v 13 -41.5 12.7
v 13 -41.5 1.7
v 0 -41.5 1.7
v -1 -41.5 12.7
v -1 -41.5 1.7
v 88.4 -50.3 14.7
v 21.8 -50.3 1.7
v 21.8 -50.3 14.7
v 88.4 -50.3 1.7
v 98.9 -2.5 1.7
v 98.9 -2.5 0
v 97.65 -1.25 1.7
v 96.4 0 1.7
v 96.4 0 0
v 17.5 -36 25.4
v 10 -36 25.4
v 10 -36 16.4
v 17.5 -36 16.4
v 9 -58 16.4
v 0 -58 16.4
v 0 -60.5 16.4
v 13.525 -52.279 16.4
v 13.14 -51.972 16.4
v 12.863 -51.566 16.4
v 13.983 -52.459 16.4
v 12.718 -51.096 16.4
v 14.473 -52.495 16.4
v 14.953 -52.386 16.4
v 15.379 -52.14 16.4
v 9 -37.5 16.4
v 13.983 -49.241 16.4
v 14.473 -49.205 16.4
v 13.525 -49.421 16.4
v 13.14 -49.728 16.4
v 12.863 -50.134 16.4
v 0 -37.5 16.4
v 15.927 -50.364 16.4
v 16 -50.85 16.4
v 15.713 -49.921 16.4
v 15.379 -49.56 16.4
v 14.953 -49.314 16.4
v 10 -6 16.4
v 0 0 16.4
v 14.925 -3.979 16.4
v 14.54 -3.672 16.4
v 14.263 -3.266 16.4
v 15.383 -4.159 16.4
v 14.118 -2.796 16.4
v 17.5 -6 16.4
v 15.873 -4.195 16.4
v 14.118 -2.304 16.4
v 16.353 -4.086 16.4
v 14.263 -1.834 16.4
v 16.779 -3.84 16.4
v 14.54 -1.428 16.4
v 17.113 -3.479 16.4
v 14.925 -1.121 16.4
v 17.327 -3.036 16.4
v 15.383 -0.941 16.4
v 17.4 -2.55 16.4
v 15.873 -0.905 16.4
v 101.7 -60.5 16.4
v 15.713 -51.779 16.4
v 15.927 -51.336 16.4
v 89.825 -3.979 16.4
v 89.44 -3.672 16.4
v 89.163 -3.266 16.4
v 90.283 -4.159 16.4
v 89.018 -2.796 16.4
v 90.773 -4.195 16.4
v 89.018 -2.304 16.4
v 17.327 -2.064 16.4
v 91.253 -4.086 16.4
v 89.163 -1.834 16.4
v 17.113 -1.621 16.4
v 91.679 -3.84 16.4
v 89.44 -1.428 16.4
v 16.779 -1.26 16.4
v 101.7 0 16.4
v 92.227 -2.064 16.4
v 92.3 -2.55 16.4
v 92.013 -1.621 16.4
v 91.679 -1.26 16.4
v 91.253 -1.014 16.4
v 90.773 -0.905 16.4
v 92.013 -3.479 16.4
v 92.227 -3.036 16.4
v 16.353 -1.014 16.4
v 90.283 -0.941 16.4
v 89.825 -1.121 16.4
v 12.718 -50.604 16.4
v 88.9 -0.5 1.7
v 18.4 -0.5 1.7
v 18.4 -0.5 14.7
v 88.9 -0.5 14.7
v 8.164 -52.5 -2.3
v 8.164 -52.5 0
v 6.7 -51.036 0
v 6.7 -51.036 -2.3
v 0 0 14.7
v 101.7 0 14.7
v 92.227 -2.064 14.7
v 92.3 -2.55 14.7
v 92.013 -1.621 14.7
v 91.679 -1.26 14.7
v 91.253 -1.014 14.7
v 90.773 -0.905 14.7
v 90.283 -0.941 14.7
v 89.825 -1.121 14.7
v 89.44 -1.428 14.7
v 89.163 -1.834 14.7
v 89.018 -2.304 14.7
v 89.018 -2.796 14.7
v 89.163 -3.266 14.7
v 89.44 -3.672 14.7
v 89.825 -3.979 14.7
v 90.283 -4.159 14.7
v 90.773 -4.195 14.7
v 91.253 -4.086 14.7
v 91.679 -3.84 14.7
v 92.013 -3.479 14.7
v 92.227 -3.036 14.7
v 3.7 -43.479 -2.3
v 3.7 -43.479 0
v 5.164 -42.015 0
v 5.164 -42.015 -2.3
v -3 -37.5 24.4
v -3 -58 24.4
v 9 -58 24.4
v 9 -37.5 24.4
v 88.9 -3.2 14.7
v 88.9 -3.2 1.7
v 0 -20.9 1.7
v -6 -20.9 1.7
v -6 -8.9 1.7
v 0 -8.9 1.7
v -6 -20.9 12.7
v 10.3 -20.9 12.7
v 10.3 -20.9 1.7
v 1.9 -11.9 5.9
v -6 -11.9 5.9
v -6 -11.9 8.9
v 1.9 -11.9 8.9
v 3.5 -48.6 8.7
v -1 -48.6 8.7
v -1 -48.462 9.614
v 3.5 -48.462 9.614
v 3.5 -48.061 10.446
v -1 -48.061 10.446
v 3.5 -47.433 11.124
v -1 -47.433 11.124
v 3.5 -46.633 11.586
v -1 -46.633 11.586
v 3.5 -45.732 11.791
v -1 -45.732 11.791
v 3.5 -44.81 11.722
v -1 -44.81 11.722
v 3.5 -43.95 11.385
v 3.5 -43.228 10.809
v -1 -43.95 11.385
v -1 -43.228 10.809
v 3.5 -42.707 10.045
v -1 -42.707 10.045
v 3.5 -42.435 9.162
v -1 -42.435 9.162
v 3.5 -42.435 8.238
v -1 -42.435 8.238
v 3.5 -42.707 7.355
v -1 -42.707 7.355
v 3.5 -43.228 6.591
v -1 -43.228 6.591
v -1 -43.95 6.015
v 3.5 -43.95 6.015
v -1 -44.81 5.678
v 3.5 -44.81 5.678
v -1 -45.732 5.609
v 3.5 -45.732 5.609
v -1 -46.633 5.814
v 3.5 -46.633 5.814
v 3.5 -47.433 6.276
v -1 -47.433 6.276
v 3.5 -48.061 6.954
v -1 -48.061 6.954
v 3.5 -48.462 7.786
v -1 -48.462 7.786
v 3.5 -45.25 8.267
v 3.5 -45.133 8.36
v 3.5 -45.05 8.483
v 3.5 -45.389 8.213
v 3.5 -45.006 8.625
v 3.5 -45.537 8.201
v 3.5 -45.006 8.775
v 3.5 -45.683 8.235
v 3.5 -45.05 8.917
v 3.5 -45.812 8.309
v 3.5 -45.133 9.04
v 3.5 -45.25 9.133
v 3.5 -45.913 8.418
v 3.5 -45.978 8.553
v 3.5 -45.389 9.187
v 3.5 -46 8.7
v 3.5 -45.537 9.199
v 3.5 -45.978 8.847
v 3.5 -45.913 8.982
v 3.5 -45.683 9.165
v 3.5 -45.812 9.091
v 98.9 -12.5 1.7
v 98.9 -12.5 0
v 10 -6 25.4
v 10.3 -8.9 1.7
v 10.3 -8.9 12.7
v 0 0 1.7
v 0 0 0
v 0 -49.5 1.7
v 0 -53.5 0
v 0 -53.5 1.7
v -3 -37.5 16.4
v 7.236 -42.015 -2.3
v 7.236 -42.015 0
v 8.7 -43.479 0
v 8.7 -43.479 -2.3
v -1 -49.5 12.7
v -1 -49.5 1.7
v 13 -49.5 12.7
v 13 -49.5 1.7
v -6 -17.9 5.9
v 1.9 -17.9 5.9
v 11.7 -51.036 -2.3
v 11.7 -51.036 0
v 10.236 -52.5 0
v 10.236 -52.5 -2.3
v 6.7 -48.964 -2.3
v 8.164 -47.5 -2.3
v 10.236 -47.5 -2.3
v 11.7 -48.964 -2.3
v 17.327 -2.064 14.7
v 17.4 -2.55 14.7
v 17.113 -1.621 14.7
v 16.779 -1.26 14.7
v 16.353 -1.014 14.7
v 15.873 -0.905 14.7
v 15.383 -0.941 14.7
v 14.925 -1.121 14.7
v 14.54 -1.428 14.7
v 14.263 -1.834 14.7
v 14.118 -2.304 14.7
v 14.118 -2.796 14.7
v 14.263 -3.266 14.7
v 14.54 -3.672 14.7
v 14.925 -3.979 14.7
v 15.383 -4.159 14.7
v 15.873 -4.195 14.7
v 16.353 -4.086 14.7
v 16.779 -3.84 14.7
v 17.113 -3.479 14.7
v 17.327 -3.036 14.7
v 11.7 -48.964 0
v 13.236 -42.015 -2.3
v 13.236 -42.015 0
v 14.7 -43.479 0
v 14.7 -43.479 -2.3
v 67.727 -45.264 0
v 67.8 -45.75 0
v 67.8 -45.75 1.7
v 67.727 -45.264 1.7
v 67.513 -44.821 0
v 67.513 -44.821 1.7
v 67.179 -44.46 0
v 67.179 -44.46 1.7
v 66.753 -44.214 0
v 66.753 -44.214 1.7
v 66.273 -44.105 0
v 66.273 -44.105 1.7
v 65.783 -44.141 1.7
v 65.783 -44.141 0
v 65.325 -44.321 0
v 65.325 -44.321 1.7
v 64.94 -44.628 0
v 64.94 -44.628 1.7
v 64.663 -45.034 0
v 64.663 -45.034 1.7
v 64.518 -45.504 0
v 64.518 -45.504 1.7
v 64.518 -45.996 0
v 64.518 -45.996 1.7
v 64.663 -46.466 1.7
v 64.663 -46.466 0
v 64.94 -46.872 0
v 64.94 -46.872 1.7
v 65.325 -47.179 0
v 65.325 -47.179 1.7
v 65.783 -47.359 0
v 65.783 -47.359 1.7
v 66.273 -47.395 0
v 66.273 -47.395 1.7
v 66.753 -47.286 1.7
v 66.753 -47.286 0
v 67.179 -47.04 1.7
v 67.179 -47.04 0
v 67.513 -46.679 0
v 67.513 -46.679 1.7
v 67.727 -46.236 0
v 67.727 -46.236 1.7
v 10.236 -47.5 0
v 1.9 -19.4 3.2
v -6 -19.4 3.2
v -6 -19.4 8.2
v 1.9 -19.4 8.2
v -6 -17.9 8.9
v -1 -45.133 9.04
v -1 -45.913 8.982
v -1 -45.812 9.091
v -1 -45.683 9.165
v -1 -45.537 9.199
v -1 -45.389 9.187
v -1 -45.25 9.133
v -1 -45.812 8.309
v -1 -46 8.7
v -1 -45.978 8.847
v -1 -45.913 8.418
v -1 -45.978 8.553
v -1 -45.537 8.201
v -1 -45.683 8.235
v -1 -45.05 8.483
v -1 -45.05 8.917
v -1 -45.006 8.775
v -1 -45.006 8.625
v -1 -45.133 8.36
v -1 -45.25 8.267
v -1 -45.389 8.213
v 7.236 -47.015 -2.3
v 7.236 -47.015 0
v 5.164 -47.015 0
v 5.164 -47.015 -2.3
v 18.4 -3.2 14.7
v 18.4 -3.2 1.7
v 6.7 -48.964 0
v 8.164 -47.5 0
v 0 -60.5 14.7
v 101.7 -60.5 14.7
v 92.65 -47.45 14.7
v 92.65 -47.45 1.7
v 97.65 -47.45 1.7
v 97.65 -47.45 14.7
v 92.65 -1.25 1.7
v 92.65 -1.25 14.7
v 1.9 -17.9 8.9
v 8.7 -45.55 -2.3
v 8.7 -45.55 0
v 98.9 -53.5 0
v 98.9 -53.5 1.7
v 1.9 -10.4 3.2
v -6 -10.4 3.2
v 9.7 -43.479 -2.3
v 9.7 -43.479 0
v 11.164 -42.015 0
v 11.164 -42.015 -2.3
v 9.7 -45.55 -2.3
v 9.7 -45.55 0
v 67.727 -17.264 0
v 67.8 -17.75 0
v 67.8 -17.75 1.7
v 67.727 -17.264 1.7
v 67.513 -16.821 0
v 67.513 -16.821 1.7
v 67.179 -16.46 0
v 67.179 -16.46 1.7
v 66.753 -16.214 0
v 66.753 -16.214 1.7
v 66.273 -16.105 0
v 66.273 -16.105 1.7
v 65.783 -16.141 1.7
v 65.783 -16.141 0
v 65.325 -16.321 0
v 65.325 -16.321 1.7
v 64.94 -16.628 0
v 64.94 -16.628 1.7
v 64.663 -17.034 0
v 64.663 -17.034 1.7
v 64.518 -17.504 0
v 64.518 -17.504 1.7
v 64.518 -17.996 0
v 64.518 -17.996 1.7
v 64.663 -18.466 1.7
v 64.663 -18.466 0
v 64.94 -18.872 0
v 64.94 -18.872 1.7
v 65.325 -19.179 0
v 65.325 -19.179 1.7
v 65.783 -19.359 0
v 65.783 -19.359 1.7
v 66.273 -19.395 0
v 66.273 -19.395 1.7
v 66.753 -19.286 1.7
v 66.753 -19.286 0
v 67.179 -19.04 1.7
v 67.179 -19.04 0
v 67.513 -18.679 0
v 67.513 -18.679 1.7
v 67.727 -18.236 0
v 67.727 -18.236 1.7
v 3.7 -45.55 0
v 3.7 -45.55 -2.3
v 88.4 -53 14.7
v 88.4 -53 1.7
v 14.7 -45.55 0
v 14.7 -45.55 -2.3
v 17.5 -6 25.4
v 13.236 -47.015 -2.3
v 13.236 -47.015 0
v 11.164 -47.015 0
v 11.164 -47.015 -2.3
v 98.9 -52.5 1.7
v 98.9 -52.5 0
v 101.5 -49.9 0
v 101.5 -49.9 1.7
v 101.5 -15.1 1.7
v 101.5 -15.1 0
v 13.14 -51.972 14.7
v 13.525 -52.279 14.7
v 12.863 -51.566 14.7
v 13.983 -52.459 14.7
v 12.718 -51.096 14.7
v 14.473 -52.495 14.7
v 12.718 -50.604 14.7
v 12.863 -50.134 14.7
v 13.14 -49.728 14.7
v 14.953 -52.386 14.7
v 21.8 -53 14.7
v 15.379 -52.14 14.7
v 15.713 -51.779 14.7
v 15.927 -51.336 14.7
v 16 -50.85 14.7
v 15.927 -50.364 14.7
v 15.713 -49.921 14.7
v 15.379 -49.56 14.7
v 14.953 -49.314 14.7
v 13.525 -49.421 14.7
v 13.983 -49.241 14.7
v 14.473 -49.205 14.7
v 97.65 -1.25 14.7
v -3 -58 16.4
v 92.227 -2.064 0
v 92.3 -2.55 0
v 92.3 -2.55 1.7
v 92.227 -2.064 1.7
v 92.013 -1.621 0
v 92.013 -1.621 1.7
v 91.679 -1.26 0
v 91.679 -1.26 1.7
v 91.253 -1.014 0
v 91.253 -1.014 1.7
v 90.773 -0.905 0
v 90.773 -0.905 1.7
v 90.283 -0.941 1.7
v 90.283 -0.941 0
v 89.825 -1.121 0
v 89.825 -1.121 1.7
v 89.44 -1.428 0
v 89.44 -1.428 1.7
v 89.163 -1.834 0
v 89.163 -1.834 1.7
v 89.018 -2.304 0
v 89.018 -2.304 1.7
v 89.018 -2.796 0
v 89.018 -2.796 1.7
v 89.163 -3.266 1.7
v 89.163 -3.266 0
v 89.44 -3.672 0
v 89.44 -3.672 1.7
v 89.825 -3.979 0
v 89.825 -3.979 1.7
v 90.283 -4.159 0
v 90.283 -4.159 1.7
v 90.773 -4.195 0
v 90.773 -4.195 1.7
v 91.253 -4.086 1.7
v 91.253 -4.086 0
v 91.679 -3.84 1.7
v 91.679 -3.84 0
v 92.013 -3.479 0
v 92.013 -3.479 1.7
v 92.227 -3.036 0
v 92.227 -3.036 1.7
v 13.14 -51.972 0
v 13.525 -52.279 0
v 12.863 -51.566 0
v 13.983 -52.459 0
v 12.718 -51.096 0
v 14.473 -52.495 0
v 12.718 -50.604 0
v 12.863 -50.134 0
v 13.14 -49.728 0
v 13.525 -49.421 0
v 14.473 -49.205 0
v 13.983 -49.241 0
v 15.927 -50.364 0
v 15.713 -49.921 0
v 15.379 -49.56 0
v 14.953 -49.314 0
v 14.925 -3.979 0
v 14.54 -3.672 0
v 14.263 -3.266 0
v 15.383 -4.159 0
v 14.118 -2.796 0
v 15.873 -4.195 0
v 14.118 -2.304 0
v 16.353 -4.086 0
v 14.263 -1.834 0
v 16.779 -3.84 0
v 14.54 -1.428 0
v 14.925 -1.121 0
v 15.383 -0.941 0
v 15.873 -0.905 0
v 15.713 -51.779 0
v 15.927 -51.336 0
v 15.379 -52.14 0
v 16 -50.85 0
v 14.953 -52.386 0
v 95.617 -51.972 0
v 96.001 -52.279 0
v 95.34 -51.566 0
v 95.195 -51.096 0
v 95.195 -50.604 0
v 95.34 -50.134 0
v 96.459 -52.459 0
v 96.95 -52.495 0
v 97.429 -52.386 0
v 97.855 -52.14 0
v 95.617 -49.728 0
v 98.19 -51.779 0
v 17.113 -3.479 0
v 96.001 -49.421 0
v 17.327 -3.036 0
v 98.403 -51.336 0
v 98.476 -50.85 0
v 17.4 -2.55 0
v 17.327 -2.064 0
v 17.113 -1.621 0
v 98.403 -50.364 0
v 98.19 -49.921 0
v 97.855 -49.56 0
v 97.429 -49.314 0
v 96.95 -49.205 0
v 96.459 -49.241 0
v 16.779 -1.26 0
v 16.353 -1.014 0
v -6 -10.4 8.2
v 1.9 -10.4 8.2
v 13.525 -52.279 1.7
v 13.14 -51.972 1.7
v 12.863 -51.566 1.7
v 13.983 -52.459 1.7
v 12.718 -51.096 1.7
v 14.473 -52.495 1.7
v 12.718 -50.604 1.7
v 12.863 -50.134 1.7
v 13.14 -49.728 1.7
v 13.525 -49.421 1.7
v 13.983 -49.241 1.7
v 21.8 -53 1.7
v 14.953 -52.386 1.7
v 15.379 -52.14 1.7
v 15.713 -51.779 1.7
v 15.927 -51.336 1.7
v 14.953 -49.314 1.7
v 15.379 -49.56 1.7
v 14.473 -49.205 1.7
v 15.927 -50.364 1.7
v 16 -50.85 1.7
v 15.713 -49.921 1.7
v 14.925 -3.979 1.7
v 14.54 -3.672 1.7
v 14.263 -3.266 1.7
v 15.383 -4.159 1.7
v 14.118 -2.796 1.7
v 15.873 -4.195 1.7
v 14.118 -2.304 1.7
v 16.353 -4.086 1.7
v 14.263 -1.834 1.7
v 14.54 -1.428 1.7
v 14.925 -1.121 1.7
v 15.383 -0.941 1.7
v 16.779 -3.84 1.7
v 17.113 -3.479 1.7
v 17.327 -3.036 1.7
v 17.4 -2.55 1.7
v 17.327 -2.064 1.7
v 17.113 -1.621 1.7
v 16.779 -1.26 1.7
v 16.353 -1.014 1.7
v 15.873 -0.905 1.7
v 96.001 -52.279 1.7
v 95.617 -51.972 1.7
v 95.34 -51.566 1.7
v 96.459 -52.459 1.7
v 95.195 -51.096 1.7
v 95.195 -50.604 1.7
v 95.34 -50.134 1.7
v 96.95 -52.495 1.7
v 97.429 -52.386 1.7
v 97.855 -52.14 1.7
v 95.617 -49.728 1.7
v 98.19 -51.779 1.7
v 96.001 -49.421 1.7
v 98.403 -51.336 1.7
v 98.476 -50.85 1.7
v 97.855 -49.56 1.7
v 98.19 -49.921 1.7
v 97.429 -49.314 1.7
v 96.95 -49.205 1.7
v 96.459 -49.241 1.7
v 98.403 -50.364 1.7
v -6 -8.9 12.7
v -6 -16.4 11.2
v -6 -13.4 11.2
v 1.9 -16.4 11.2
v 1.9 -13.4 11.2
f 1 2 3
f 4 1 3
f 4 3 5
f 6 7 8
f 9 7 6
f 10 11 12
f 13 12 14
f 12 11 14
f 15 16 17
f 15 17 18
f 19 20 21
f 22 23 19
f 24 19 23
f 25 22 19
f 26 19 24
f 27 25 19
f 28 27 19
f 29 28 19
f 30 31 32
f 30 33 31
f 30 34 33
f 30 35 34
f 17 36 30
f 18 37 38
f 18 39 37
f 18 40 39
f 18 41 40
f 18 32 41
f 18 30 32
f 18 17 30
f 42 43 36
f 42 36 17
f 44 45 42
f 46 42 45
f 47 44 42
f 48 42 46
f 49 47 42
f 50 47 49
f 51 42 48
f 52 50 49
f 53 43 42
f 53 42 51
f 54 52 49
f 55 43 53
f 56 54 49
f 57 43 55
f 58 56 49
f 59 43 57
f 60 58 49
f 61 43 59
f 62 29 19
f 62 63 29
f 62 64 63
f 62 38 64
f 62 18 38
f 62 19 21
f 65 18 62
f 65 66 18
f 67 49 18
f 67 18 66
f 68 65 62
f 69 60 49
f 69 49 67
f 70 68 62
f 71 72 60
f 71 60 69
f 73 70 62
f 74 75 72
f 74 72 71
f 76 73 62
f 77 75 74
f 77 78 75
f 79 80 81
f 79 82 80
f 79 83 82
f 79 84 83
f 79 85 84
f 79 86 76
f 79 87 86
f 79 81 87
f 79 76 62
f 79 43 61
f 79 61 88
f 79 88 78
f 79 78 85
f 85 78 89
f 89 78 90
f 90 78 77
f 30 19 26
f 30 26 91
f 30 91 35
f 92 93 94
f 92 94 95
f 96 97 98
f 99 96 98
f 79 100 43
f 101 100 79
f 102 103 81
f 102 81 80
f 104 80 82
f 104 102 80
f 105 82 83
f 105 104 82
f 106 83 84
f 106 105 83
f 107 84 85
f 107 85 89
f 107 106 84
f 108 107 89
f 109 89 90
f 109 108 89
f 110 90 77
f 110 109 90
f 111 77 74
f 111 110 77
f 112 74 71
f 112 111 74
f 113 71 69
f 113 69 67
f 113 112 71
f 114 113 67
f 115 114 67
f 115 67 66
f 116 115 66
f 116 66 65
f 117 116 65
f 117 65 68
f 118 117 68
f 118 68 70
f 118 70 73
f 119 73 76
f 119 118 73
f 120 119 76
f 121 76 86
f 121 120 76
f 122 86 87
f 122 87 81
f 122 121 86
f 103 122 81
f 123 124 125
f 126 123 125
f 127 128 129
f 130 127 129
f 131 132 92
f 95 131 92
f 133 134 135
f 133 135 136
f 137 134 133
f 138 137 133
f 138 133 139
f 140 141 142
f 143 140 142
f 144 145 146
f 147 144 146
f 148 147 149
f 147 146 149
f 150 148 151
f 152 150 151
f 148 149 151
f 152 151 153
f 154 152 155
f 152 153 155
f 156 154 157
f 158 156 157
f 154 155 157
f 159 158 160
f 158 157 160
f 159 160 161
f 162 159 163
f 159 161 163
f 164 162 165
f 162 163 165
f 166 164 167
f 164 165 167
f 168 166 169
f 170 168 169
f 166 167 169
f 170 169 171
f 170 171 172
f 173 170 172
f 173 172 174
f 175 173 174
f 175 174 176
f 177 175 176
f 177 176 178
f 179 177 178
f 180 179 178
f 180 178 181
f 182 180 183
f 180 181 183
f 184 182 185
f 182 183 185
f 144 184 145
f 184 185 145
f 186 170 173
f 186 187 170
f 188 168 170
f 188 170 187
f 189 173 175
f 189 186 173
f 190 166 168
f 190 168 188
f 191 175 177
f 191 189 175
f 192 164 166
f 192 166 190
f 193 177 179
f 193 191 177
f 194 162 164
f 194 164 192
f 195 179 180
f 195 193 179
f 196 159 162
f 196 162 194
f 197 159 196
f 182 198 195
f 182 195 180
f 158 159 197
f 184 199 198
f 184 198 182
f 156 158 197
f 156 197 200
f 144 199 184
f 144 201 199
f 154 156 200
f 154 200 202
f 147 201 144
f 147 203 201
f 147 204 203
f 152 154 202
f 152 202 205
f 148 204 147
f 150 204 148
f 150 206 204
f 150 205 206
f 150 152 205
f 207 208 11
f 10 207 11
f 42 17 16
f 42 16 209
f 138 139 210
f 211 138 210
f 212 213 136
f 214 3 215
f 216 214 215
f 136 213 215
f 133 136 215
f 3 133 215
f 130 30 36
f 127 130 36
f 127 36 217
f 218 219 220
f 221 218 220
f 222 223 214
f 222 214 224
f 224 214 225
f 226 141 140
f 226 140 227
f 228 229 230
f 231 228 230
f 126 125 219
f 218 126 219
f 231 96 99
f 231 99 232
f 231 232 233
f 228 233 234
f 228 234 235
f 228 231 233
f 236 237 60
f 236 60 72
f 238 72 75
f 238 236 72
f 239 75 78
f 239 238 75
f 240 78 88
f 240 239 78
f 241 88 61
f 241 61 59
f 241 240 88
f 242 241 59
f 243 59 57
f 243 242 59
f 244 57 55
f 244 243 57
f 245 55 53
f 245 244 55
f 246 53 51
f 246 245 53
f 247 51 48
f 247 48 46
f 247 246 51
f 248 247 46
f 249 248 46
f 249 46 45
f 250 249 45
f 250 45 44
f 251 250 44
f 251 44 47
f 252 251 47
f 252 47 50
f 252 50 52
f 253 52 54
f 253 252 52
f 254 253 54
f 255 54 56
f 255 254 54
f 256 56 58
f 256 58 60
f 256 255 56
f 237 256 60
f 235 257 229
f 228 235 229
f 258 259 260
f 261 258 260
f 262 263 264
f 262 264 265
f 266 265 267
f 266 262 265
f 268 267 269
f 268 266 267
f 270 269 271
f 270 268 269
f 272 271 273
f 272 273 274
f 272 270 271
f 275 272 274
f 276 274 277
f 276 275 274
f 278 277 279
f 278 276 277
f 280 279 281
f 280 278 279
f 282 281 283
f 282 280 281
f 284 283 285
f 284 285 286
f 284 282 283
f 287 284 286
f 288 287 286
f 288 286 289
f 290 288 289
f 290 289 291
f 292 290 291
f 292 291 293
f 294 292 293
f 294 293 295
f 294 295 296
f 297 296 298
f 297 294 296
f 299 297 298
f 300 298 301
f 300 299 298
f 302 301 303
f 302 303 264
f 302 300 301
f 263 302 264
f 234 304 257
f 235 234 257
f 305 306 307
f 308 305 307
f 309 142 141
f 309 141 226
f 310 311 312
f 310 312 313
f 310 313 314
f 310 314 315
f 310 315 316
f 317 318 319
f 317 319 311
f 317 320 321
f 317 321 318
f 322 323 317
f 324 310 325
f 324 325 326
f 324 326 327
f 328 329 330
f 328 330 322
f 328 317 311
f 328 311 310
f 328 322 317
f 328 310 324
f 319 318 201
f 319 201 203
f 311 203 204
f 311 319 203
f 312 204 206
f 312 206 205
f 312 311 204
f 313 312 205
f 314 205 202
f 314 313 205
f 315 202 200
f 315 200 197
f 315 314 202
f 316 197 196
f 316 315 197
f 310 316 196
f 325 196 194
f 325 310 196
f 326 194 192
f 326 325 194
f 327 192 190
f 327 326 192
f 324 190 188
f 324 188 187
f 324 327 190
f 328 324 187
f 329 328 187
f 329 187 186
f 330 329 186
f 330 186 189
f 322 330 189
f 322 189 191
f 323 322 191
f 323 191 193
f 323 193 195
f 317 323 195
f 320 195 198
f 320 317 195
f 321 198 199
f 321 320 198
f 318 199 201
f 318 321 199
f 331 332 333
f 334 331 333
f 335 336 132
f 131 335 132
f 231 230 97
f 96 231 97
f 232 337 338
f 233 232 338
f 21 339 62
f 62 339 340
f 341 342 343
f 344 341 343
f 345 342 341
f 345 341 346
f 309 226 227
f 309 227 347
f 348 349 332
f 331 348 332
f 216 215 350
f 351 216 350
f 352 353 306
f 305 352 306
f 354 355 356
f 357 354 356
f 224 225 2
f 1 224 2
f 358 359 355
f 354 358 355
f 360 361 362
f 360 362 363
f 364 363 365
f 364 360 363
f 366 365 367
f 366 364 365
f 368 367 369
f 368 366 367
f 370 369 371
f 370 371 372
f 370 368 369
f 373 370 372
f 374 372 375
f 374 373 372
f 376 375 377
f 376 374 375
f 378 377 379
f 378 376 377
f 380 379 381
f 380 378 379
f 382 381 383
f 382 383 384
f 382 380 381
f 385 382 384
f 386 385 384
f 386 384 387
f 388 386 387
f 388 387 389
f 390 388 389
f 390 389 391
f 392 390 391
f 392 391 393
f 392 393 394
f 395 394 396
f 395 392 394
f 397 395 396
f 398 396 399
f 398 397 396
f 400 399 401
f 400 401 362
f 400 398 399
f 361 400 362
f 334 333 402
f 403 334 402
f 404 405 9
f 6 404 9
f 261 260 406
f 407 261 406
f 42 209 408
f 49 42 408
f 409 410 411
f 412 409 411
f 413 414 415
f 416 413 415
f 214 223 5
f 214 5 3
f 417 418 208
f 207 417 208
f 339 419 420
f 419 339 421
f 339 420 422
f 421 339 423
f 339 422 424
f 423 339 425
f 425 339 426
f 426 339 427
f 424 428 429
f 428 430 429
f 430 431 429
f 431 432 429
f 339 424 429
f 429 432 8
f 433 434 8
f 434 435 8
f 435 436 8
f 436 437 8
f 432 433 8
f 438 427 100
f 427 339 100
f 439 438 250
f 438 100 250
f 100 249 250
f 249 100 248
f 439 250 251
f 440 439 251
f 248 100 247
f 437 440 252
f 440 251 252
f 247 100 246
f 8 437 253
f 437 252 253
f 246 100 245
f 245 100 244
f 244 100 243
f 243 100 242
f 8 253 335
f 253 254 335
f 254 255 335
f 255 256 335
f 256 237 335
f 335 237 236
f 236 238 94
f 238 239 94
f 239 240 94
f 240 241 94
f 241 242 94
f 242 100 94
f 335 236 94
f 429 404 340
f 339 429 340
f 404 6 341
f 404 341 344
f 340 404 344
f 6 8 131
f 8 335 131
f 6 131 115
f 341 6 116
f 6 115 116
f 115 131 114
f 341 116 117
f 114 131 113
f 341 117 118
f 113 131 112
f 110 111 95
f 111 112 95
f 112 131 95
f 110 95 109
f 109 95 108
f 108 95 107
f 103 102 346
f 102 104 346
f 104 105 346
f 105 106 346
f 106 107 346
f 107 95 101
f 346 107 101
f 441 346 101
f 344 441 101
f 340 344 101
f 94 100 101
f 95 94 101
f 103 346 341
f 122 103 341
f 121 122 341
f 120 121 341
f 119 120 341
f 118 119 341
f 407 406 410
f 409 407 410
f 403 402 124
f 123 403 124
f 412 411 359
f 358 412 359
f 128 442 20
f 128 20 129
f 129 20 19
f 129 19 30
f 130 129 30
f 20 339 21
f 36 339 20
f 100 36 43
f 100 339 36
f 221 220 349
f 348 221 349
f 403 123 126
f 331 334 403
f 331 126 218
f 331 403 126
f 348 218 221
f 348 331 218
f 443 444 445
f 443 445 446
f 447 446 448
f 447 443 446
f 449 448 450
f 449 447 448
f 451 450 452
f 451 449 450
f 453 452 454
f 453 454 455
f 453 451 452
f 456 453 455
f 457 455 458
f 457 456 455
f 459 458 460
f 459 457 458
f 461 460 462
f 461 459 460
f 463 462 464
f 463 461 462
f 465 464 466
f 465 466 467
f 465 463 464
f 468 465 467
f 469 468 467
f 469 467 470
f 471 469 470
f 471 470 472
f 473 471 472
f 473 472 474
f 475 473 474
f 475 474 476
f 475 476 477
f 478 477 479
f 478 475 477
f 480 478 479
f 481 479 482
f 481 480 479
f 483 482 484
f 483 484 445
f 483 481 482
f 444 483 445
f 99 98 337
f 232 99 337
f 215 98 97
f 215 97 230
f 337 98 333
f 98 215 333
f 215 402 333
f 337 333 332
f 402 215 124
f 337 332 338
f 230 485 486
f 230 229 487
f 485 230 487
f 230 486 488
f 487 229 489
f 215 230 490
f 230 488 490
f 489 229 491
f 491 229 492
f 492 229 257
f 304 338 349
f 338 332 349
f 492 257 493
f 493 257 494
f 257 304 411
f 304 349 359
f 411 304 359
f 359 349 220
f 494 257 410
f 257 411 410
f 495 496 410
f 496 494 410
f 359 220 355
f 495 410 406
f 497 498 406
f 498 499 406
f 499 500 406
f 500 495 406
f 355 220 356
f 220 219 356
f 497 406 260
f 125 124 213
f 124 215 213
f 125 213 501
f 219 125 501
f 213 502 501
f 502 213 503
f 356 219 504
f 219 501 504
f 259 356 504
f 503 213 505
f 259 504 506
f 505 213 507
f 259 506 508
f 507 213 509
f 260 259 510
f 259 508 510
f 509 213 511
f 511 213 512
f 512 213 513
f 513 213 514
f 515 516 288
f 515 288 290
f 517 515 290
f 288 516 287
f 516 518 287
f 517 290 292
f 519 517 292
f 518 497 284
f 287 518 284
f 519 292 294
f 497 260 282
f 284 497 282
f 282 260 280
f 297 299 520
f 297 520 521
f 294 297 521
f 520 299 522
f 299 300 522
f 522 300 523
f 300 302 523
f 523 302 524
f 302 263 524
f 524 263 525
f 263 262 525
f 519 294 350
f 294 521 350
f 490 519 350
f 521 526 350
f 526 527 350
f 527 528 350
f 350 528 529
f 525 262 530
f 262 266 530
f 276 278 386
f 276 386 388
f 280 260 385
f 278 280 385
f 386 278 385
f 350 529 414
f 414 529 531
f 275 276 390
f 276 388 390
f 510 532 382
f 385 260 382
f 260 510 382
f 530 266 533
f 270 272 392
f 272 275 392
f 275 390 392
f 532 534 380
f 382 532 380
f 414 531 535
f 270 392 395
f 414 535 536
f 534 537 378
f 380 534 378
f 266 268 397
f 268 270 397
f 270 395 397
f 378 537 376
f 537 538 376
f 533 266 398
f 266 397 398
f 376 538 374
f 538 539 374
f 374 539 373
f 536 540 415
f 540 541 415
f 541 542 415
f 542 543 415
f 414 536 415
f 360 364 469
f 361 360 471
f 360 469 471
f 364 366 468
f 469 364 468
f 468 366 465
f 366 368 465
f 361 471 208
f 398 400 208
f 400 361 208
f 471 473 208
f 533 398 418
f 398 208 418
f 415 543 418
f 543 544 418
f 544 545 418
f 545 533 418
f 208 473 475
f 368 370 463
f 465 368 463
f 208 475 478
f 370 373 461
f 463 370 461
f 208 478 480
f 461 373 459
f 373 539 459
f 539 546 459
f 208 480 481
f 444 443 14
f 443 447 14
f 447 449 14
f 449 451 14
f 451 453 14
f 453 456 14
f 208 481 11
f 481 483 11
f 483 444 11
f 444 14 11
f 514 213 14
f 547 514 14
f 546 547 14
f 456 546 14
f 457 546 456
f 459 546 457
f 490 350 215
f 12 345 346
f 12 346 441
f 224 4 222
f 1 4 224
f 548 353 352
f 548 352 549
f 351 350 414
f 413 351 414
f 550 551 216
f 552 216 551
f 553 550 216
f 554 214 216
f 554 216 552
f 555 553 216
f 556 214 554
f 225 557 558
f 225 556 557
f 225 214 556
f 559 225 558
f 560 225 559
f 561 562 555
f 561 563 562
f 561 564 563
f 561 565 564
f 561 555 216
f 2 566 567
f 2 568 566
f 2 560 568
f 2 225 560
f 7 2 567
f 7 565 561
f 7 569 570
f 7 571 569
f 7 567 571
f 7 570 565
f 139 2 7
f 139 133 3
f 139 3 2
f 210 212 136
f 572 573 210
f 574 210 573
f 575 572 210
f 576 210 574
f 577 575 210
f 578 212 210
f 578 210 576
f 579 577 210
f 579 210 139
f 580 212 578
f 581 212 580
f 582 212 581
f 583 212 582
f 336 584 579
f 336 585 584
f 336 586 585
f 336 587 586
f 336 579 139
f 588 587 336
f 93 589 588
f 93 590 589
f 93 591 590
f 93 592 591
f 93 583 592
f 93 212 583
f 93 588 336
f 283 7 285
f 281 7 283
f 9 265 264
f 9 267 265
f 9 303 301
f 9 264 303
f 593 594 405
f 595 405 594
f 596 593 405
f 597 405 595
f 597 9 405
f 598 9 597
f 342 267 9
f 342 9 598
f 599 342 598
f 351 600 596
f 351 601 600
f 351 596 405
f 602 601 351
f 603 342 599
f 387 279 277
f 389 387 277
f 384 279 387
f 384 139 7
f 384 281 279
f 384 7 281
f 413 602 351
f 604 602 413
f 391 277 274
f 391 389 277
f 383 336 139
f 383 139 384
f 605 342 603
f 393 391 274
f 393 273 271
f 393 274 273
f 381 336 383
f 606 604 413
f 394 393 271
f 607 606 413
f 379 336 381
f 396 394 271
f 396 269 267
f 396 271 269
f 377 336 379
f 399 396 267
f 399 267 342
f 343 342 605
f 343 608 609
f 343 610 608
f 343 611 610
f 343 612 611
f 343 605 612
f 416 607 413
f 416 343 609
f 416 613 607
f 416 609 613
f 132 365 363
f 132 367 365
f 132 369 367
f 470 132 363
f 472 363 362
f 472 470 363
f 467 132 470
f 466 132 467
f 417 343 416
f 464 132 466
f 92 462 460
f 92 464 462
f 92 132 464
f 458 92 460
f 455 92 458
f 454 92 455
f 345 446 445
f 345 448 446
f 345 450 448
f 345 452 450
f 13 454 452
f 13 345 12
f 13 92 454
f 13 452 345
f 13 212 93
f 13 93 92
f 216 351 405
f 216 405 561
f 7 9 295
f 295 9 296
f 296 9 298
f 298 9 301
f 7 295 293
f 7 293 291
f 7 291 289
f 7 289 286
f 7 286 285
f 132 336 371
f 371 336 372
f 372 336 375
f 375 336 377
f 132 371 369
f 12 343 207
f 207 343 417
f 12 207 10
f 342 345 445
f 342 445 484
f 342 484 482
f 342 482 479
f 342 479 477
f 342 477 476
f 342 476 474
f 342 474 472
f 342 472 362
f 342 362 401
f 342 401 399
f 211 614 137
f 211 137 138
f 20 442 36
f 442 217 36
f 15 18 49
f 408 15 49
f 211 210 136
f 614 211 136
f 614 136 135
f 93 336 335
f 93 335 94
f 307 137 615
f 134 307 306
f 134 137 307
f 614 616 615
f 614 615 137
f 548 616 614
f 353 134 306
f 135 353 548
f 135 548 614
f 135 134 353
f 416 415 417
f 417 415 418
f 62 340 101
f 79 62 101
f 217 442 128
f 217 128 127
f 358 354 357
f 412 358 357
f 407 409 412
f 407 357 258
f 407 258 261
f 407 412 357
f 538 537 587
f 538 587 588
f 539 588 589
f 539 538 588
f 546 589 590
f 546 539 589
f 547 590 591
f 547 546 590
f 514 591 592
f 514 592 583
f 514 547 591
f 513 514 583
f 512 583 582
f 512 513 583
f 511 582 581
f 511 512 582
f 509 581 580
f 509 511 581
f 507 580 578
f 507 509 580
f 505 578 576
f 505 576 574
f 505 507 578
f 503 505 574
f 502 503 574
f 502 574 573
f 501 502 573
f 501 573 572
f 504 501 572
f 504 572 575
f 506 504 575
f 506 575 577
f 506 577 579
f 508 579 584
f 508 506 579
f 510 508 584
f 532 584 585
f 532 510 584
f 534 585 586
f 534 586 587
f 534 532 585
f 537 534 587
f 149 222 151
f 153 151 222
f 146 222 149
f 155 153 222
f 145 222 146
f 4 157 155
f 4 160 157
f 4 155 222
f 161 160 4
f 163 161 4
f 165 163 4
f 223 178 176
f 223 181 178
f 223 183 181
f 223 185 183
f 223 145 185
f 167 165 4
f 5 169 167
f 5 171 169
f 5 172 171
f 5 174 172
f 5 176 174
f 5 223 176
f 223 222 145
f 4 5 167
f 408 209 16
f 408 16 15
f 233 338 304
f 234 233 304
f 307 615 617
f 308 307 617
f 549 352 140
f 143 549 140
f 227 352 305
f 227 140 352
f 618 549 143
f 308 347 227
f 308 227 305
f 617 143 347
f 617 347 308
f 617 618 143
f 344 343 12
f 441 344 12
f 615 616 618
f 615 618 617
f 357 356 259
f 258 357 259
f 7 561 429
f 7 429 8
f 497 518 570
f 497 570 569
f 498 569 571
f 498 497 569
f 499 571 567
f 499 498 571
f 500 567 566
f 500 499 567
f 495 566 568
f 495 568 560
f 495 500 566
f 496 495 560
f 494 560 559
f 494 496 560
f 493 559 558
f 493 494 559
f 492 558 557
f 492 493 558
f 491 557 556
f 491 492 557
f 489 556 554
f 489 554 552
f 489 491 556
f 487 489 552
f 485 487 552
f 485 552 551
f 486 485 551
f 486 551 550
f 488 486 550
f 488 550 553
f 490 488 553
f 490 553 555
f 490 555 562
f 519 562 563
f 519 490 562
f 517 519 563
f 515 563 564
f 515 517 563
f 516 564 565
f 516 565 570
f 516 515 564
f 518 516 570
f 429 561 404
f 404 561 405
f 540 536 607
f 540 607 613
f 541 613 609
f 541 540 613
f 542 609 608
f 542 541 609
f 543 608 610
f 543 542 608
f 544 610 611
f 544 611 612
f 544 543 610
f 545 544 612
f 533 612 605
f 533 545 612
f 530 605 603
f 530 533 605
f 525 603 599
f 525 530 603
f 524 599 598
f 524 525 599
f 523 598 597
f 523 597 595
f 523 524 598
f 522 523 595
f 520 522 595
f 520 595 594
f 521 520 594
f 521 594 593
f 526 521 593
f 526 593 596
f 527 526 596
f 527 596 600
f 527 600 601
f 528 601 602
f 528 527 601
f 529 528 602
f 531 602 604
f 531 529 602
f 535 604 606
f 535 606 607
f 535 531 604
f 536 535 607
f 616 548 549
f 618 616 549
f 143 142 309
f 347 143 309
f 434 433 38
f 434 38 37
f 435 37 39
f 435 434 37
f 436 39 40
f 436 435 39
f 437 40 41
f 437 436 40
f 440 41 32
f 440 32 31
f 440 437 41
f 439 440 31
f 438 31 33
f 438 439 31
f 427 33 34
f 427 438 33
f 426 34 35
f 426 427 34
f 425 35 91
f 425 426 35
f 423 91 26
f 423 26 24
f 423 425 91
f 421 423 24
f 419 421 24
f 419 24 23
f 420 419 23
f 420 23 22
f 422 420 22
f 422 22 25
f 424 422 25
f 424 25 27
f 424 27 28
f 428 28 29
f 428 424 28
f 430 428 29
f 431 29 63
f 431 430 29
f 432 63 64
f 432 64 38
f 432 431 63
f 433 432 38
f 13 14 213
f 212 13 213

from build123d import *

# Parameters (mm, degrees)
F0_R      = 1.65
F1_DEPTH  = 1.7
F3_DEPTH  = 2.3
F4_W      = 66.6
F4_H      = 2.7
F4_W_2    = 70.5
F4_W_3    = 5
F4_H_2    = 46.2
F5_DEPTH  = 13
F4_W_4    = 10.3
F4_H_3    = 12
F4_W_5    = 6
F6_DEPTH  = 11
F4_W_6    = 13
F4_H_4    = 8
F4_W_7    = 1
F7_DEPTH  = 11
F8_W      = 9
F8_H      = 8
F9_DEPTH  = 7.9
F10_R     = 3.1
F10_R_2   = 0.5
F11_DEPTH = 4.5
F12_SIZE  = 3
F13_W     = 6
F13_H     = 3
F14_DEPTH = 7.9
F16_W     = 101.7
F16_H     = 60.5
F16_R     = 1.65
F17_DEPTH = 1.7
F18_W     = 7.5
F18_H     = 30
F19_DEPTH = 9
F18_W_2   = 9
F18_H_2   = 20.5
F18_W_3   = 3
F20_DEPTH = 8


with BuildPart() as f1:
    # F0 (on Top) → F1 (new body)
    with BuildSketch(Plane.XY):
        Polygon((96.4, 0), (0, 0), (0, -8.9), (0, -20.9), (0, -40.5), (0, -49.5), (0, -53.5), (98.9, -53.5), (98.9, -52.5), (101.5, -49.9), (101.5, -15.1), (98.9, -12.5), (98.9, -2.5), align=None)
        with Locations((14.35, -50.85)):
            Circle(F0_R, mode=Mode.SUBTRACT)
        with Locations((66.15, -45.75)):
            Circle(F0_R, mode=Mode.SUBTRACT)
        with Locations((96.8263558647, -50.85)):
            Circle(F0_R, mode=Mode.SUBTRACT)
        with Locations((15.75, -2.55)):
            Circle(F0_R, mode=Mode.SUBTRACT)
        with Locations((66.15, -17.75)):
            Circle(F0_R, mode=Mode.SUBTRACT)
        with Locations((90.65, -2.55)):
            Circle(F0_R, mode=Mode.SUBTRACT)
    extrude(amount=F1_DEPTH)

    # F2 (on face) → F3 (join)
    with BuildSketch(Plane(origin=(0, 0, 0), x_dir=(1, 0, 0), z_dir=(0, 0, -1))):
        Polygon((10.2355339059, 52.5), (8.1644660941, 52.5), (6.7, 51.0355339059), (6.7, 48.9644660941), (8.1644660941, 47.5), (10.2355339059, 47.5), (11.7, 48.9644660941), (11.7, 51.0355339059), align=None)
        Polygon((7.2355339059, 47.0147186258), (5.1644660941, 47.0147186258), (3.7, 45.5502525317), (3.7, 43.4791847198), (5.1644660941, 42.0147186258), (7.2355339059, 42.0147186258), (8.7, 43.4791847198), (8.7, 45.5502525317), align=None)
        Polygon((13.2355339059, 47.0147186258), (11.1644660941, 47.0147186258), (9.7, 45.5502525317), (9.7, 43.4791847198), (11.1644660941, 42.0147186258), (13.2355339059, 42.0147186258), (14.7, 43.4791847198), (14.7, 45.5502525317), align=None)
    extrude(amount=F3_DEPTH)

    # F4 (on face) → F5 (join)
    with BuildSketch(Plane.XY.offset(1.7)):
        with Locations((55.1, -51.65)):
            Rectangle(F4_W, F4_H)
        with Locations((53.65, -1.85)):
            Rectangle(F4_W_2, F4_H)
        with Locations((95.15, -24.35)):
            Rectangle(F4_W_3, F4_H_2)
    extrude(amount=F5_DEPTH)

    # F4 (on face) → F6 (join)
    with BuildSketch(Plane.XY.offset(1.7)):
        with Locations((5.15, -14.9)):
            Rectangle(F4_W_4, F4_H_3)
        with Locations((-3, -14.9)):
            Rectangle(F4_W_5, F4_H_3)
    extrude(amount=F6_DEPTH)

    # F4 (on face) → F7 (join)
    with BuildSketch(Plane.XY.offset(1.7)):
        with Locations((6.5, -45.5)):
            Rectangle(F4_W_6, F4_H_4)
        with Locations((-0.5, -45.5)):
            Rectangle(F4_W_7, F4_H_4)
    extrude(amount=F7_DEPTH)

    # F8 (on face) → F9 (cut)
    with BuildSketch(Plane(origin=(-6, 0, 0), x_dir=(0, -1, 0), z_dir=(-1, 0, 0))):
        with Locations((14.9, 7.2)):
            Rectangle(F8_W, F8_H)
    extrude(amount=-F9_DEPTH, mode=Mode.SUBTRACT)

    # F10 (on face) → F11 (cut)
    with BuildSketch(Plane(origin=(-1, 0, 0), x_dir=(0, -1, 0), z_dir=(-1, 0, 0))):
        with Locations((45.5, 8.7)):
            Circle(F10_R)
        with Locations((45.5, 8.7)):
            Circle(F10_R_2, mode=Mode.SUBTRACT)
    extrude(amount=-F11_DEPTH, mode=Mode.SUBTRACT)

    # F12
    f12_edges = [f1.edges().sort_by_distance(p)[0] for p in [
        (-2.05, -10.4, 11.2),
        (-2.05, -19.4, 11.2),
    ]]
    chamfer(f12_edges, length=F12_SIZE)

    # F13 (on face) → F14 (join, through all)
    with BuildSketch(Plane(origin=(1.9, 0, 0), x_dir=(0, -1, 0), z_dir=(-1, 0, 0))):
        with Locations((14.9, 7.4)):
            Rectangle(F13_W, F13_H)
    extrude(amount=F14_DEPTH)

    # F16 (on offset) → F17 (join)
    with BuildSketch(Plane.XY.offset(14.7)):
        with Locations((50.85, -30.25)):
            Rectangle(F16_W, F16_H)
        with Locations((14.35, -50.85)):
            Circle(F16_R, mode=Mode.SUBTRACT)
        with Locations((15.75, -2.55)):
            Circle(F16_R, mode=Mode.SUBTRACT)
        with Locations((90.65, -2.55)):
            Circle(F16_R, mode=Mode.SUBTRACT)
    extrude(amount=F17_DEPTH)

    # F18 (on face) → F19 (join)
    with BuildSketch(Plane.XY.offset(16.4)):
        with Locations((13.75, -21)):
            Rectangle(F18_W, F18_H)
    extrude(amount=F19_DEPTH)

    # F18 (on face) → F20 (join)
    with BuildSketch(Plane.XY.offset(16.4)):
        with Locations((4.5, -47.75)):
            Rectangle(F18_W_2, F18_H_2)
        with Locations((-1.5, -47.75)):
            Rectangle(F18_W_3, F18_H_2)
    extrude(amount=F20_DEPTH)


solid = f1.part
